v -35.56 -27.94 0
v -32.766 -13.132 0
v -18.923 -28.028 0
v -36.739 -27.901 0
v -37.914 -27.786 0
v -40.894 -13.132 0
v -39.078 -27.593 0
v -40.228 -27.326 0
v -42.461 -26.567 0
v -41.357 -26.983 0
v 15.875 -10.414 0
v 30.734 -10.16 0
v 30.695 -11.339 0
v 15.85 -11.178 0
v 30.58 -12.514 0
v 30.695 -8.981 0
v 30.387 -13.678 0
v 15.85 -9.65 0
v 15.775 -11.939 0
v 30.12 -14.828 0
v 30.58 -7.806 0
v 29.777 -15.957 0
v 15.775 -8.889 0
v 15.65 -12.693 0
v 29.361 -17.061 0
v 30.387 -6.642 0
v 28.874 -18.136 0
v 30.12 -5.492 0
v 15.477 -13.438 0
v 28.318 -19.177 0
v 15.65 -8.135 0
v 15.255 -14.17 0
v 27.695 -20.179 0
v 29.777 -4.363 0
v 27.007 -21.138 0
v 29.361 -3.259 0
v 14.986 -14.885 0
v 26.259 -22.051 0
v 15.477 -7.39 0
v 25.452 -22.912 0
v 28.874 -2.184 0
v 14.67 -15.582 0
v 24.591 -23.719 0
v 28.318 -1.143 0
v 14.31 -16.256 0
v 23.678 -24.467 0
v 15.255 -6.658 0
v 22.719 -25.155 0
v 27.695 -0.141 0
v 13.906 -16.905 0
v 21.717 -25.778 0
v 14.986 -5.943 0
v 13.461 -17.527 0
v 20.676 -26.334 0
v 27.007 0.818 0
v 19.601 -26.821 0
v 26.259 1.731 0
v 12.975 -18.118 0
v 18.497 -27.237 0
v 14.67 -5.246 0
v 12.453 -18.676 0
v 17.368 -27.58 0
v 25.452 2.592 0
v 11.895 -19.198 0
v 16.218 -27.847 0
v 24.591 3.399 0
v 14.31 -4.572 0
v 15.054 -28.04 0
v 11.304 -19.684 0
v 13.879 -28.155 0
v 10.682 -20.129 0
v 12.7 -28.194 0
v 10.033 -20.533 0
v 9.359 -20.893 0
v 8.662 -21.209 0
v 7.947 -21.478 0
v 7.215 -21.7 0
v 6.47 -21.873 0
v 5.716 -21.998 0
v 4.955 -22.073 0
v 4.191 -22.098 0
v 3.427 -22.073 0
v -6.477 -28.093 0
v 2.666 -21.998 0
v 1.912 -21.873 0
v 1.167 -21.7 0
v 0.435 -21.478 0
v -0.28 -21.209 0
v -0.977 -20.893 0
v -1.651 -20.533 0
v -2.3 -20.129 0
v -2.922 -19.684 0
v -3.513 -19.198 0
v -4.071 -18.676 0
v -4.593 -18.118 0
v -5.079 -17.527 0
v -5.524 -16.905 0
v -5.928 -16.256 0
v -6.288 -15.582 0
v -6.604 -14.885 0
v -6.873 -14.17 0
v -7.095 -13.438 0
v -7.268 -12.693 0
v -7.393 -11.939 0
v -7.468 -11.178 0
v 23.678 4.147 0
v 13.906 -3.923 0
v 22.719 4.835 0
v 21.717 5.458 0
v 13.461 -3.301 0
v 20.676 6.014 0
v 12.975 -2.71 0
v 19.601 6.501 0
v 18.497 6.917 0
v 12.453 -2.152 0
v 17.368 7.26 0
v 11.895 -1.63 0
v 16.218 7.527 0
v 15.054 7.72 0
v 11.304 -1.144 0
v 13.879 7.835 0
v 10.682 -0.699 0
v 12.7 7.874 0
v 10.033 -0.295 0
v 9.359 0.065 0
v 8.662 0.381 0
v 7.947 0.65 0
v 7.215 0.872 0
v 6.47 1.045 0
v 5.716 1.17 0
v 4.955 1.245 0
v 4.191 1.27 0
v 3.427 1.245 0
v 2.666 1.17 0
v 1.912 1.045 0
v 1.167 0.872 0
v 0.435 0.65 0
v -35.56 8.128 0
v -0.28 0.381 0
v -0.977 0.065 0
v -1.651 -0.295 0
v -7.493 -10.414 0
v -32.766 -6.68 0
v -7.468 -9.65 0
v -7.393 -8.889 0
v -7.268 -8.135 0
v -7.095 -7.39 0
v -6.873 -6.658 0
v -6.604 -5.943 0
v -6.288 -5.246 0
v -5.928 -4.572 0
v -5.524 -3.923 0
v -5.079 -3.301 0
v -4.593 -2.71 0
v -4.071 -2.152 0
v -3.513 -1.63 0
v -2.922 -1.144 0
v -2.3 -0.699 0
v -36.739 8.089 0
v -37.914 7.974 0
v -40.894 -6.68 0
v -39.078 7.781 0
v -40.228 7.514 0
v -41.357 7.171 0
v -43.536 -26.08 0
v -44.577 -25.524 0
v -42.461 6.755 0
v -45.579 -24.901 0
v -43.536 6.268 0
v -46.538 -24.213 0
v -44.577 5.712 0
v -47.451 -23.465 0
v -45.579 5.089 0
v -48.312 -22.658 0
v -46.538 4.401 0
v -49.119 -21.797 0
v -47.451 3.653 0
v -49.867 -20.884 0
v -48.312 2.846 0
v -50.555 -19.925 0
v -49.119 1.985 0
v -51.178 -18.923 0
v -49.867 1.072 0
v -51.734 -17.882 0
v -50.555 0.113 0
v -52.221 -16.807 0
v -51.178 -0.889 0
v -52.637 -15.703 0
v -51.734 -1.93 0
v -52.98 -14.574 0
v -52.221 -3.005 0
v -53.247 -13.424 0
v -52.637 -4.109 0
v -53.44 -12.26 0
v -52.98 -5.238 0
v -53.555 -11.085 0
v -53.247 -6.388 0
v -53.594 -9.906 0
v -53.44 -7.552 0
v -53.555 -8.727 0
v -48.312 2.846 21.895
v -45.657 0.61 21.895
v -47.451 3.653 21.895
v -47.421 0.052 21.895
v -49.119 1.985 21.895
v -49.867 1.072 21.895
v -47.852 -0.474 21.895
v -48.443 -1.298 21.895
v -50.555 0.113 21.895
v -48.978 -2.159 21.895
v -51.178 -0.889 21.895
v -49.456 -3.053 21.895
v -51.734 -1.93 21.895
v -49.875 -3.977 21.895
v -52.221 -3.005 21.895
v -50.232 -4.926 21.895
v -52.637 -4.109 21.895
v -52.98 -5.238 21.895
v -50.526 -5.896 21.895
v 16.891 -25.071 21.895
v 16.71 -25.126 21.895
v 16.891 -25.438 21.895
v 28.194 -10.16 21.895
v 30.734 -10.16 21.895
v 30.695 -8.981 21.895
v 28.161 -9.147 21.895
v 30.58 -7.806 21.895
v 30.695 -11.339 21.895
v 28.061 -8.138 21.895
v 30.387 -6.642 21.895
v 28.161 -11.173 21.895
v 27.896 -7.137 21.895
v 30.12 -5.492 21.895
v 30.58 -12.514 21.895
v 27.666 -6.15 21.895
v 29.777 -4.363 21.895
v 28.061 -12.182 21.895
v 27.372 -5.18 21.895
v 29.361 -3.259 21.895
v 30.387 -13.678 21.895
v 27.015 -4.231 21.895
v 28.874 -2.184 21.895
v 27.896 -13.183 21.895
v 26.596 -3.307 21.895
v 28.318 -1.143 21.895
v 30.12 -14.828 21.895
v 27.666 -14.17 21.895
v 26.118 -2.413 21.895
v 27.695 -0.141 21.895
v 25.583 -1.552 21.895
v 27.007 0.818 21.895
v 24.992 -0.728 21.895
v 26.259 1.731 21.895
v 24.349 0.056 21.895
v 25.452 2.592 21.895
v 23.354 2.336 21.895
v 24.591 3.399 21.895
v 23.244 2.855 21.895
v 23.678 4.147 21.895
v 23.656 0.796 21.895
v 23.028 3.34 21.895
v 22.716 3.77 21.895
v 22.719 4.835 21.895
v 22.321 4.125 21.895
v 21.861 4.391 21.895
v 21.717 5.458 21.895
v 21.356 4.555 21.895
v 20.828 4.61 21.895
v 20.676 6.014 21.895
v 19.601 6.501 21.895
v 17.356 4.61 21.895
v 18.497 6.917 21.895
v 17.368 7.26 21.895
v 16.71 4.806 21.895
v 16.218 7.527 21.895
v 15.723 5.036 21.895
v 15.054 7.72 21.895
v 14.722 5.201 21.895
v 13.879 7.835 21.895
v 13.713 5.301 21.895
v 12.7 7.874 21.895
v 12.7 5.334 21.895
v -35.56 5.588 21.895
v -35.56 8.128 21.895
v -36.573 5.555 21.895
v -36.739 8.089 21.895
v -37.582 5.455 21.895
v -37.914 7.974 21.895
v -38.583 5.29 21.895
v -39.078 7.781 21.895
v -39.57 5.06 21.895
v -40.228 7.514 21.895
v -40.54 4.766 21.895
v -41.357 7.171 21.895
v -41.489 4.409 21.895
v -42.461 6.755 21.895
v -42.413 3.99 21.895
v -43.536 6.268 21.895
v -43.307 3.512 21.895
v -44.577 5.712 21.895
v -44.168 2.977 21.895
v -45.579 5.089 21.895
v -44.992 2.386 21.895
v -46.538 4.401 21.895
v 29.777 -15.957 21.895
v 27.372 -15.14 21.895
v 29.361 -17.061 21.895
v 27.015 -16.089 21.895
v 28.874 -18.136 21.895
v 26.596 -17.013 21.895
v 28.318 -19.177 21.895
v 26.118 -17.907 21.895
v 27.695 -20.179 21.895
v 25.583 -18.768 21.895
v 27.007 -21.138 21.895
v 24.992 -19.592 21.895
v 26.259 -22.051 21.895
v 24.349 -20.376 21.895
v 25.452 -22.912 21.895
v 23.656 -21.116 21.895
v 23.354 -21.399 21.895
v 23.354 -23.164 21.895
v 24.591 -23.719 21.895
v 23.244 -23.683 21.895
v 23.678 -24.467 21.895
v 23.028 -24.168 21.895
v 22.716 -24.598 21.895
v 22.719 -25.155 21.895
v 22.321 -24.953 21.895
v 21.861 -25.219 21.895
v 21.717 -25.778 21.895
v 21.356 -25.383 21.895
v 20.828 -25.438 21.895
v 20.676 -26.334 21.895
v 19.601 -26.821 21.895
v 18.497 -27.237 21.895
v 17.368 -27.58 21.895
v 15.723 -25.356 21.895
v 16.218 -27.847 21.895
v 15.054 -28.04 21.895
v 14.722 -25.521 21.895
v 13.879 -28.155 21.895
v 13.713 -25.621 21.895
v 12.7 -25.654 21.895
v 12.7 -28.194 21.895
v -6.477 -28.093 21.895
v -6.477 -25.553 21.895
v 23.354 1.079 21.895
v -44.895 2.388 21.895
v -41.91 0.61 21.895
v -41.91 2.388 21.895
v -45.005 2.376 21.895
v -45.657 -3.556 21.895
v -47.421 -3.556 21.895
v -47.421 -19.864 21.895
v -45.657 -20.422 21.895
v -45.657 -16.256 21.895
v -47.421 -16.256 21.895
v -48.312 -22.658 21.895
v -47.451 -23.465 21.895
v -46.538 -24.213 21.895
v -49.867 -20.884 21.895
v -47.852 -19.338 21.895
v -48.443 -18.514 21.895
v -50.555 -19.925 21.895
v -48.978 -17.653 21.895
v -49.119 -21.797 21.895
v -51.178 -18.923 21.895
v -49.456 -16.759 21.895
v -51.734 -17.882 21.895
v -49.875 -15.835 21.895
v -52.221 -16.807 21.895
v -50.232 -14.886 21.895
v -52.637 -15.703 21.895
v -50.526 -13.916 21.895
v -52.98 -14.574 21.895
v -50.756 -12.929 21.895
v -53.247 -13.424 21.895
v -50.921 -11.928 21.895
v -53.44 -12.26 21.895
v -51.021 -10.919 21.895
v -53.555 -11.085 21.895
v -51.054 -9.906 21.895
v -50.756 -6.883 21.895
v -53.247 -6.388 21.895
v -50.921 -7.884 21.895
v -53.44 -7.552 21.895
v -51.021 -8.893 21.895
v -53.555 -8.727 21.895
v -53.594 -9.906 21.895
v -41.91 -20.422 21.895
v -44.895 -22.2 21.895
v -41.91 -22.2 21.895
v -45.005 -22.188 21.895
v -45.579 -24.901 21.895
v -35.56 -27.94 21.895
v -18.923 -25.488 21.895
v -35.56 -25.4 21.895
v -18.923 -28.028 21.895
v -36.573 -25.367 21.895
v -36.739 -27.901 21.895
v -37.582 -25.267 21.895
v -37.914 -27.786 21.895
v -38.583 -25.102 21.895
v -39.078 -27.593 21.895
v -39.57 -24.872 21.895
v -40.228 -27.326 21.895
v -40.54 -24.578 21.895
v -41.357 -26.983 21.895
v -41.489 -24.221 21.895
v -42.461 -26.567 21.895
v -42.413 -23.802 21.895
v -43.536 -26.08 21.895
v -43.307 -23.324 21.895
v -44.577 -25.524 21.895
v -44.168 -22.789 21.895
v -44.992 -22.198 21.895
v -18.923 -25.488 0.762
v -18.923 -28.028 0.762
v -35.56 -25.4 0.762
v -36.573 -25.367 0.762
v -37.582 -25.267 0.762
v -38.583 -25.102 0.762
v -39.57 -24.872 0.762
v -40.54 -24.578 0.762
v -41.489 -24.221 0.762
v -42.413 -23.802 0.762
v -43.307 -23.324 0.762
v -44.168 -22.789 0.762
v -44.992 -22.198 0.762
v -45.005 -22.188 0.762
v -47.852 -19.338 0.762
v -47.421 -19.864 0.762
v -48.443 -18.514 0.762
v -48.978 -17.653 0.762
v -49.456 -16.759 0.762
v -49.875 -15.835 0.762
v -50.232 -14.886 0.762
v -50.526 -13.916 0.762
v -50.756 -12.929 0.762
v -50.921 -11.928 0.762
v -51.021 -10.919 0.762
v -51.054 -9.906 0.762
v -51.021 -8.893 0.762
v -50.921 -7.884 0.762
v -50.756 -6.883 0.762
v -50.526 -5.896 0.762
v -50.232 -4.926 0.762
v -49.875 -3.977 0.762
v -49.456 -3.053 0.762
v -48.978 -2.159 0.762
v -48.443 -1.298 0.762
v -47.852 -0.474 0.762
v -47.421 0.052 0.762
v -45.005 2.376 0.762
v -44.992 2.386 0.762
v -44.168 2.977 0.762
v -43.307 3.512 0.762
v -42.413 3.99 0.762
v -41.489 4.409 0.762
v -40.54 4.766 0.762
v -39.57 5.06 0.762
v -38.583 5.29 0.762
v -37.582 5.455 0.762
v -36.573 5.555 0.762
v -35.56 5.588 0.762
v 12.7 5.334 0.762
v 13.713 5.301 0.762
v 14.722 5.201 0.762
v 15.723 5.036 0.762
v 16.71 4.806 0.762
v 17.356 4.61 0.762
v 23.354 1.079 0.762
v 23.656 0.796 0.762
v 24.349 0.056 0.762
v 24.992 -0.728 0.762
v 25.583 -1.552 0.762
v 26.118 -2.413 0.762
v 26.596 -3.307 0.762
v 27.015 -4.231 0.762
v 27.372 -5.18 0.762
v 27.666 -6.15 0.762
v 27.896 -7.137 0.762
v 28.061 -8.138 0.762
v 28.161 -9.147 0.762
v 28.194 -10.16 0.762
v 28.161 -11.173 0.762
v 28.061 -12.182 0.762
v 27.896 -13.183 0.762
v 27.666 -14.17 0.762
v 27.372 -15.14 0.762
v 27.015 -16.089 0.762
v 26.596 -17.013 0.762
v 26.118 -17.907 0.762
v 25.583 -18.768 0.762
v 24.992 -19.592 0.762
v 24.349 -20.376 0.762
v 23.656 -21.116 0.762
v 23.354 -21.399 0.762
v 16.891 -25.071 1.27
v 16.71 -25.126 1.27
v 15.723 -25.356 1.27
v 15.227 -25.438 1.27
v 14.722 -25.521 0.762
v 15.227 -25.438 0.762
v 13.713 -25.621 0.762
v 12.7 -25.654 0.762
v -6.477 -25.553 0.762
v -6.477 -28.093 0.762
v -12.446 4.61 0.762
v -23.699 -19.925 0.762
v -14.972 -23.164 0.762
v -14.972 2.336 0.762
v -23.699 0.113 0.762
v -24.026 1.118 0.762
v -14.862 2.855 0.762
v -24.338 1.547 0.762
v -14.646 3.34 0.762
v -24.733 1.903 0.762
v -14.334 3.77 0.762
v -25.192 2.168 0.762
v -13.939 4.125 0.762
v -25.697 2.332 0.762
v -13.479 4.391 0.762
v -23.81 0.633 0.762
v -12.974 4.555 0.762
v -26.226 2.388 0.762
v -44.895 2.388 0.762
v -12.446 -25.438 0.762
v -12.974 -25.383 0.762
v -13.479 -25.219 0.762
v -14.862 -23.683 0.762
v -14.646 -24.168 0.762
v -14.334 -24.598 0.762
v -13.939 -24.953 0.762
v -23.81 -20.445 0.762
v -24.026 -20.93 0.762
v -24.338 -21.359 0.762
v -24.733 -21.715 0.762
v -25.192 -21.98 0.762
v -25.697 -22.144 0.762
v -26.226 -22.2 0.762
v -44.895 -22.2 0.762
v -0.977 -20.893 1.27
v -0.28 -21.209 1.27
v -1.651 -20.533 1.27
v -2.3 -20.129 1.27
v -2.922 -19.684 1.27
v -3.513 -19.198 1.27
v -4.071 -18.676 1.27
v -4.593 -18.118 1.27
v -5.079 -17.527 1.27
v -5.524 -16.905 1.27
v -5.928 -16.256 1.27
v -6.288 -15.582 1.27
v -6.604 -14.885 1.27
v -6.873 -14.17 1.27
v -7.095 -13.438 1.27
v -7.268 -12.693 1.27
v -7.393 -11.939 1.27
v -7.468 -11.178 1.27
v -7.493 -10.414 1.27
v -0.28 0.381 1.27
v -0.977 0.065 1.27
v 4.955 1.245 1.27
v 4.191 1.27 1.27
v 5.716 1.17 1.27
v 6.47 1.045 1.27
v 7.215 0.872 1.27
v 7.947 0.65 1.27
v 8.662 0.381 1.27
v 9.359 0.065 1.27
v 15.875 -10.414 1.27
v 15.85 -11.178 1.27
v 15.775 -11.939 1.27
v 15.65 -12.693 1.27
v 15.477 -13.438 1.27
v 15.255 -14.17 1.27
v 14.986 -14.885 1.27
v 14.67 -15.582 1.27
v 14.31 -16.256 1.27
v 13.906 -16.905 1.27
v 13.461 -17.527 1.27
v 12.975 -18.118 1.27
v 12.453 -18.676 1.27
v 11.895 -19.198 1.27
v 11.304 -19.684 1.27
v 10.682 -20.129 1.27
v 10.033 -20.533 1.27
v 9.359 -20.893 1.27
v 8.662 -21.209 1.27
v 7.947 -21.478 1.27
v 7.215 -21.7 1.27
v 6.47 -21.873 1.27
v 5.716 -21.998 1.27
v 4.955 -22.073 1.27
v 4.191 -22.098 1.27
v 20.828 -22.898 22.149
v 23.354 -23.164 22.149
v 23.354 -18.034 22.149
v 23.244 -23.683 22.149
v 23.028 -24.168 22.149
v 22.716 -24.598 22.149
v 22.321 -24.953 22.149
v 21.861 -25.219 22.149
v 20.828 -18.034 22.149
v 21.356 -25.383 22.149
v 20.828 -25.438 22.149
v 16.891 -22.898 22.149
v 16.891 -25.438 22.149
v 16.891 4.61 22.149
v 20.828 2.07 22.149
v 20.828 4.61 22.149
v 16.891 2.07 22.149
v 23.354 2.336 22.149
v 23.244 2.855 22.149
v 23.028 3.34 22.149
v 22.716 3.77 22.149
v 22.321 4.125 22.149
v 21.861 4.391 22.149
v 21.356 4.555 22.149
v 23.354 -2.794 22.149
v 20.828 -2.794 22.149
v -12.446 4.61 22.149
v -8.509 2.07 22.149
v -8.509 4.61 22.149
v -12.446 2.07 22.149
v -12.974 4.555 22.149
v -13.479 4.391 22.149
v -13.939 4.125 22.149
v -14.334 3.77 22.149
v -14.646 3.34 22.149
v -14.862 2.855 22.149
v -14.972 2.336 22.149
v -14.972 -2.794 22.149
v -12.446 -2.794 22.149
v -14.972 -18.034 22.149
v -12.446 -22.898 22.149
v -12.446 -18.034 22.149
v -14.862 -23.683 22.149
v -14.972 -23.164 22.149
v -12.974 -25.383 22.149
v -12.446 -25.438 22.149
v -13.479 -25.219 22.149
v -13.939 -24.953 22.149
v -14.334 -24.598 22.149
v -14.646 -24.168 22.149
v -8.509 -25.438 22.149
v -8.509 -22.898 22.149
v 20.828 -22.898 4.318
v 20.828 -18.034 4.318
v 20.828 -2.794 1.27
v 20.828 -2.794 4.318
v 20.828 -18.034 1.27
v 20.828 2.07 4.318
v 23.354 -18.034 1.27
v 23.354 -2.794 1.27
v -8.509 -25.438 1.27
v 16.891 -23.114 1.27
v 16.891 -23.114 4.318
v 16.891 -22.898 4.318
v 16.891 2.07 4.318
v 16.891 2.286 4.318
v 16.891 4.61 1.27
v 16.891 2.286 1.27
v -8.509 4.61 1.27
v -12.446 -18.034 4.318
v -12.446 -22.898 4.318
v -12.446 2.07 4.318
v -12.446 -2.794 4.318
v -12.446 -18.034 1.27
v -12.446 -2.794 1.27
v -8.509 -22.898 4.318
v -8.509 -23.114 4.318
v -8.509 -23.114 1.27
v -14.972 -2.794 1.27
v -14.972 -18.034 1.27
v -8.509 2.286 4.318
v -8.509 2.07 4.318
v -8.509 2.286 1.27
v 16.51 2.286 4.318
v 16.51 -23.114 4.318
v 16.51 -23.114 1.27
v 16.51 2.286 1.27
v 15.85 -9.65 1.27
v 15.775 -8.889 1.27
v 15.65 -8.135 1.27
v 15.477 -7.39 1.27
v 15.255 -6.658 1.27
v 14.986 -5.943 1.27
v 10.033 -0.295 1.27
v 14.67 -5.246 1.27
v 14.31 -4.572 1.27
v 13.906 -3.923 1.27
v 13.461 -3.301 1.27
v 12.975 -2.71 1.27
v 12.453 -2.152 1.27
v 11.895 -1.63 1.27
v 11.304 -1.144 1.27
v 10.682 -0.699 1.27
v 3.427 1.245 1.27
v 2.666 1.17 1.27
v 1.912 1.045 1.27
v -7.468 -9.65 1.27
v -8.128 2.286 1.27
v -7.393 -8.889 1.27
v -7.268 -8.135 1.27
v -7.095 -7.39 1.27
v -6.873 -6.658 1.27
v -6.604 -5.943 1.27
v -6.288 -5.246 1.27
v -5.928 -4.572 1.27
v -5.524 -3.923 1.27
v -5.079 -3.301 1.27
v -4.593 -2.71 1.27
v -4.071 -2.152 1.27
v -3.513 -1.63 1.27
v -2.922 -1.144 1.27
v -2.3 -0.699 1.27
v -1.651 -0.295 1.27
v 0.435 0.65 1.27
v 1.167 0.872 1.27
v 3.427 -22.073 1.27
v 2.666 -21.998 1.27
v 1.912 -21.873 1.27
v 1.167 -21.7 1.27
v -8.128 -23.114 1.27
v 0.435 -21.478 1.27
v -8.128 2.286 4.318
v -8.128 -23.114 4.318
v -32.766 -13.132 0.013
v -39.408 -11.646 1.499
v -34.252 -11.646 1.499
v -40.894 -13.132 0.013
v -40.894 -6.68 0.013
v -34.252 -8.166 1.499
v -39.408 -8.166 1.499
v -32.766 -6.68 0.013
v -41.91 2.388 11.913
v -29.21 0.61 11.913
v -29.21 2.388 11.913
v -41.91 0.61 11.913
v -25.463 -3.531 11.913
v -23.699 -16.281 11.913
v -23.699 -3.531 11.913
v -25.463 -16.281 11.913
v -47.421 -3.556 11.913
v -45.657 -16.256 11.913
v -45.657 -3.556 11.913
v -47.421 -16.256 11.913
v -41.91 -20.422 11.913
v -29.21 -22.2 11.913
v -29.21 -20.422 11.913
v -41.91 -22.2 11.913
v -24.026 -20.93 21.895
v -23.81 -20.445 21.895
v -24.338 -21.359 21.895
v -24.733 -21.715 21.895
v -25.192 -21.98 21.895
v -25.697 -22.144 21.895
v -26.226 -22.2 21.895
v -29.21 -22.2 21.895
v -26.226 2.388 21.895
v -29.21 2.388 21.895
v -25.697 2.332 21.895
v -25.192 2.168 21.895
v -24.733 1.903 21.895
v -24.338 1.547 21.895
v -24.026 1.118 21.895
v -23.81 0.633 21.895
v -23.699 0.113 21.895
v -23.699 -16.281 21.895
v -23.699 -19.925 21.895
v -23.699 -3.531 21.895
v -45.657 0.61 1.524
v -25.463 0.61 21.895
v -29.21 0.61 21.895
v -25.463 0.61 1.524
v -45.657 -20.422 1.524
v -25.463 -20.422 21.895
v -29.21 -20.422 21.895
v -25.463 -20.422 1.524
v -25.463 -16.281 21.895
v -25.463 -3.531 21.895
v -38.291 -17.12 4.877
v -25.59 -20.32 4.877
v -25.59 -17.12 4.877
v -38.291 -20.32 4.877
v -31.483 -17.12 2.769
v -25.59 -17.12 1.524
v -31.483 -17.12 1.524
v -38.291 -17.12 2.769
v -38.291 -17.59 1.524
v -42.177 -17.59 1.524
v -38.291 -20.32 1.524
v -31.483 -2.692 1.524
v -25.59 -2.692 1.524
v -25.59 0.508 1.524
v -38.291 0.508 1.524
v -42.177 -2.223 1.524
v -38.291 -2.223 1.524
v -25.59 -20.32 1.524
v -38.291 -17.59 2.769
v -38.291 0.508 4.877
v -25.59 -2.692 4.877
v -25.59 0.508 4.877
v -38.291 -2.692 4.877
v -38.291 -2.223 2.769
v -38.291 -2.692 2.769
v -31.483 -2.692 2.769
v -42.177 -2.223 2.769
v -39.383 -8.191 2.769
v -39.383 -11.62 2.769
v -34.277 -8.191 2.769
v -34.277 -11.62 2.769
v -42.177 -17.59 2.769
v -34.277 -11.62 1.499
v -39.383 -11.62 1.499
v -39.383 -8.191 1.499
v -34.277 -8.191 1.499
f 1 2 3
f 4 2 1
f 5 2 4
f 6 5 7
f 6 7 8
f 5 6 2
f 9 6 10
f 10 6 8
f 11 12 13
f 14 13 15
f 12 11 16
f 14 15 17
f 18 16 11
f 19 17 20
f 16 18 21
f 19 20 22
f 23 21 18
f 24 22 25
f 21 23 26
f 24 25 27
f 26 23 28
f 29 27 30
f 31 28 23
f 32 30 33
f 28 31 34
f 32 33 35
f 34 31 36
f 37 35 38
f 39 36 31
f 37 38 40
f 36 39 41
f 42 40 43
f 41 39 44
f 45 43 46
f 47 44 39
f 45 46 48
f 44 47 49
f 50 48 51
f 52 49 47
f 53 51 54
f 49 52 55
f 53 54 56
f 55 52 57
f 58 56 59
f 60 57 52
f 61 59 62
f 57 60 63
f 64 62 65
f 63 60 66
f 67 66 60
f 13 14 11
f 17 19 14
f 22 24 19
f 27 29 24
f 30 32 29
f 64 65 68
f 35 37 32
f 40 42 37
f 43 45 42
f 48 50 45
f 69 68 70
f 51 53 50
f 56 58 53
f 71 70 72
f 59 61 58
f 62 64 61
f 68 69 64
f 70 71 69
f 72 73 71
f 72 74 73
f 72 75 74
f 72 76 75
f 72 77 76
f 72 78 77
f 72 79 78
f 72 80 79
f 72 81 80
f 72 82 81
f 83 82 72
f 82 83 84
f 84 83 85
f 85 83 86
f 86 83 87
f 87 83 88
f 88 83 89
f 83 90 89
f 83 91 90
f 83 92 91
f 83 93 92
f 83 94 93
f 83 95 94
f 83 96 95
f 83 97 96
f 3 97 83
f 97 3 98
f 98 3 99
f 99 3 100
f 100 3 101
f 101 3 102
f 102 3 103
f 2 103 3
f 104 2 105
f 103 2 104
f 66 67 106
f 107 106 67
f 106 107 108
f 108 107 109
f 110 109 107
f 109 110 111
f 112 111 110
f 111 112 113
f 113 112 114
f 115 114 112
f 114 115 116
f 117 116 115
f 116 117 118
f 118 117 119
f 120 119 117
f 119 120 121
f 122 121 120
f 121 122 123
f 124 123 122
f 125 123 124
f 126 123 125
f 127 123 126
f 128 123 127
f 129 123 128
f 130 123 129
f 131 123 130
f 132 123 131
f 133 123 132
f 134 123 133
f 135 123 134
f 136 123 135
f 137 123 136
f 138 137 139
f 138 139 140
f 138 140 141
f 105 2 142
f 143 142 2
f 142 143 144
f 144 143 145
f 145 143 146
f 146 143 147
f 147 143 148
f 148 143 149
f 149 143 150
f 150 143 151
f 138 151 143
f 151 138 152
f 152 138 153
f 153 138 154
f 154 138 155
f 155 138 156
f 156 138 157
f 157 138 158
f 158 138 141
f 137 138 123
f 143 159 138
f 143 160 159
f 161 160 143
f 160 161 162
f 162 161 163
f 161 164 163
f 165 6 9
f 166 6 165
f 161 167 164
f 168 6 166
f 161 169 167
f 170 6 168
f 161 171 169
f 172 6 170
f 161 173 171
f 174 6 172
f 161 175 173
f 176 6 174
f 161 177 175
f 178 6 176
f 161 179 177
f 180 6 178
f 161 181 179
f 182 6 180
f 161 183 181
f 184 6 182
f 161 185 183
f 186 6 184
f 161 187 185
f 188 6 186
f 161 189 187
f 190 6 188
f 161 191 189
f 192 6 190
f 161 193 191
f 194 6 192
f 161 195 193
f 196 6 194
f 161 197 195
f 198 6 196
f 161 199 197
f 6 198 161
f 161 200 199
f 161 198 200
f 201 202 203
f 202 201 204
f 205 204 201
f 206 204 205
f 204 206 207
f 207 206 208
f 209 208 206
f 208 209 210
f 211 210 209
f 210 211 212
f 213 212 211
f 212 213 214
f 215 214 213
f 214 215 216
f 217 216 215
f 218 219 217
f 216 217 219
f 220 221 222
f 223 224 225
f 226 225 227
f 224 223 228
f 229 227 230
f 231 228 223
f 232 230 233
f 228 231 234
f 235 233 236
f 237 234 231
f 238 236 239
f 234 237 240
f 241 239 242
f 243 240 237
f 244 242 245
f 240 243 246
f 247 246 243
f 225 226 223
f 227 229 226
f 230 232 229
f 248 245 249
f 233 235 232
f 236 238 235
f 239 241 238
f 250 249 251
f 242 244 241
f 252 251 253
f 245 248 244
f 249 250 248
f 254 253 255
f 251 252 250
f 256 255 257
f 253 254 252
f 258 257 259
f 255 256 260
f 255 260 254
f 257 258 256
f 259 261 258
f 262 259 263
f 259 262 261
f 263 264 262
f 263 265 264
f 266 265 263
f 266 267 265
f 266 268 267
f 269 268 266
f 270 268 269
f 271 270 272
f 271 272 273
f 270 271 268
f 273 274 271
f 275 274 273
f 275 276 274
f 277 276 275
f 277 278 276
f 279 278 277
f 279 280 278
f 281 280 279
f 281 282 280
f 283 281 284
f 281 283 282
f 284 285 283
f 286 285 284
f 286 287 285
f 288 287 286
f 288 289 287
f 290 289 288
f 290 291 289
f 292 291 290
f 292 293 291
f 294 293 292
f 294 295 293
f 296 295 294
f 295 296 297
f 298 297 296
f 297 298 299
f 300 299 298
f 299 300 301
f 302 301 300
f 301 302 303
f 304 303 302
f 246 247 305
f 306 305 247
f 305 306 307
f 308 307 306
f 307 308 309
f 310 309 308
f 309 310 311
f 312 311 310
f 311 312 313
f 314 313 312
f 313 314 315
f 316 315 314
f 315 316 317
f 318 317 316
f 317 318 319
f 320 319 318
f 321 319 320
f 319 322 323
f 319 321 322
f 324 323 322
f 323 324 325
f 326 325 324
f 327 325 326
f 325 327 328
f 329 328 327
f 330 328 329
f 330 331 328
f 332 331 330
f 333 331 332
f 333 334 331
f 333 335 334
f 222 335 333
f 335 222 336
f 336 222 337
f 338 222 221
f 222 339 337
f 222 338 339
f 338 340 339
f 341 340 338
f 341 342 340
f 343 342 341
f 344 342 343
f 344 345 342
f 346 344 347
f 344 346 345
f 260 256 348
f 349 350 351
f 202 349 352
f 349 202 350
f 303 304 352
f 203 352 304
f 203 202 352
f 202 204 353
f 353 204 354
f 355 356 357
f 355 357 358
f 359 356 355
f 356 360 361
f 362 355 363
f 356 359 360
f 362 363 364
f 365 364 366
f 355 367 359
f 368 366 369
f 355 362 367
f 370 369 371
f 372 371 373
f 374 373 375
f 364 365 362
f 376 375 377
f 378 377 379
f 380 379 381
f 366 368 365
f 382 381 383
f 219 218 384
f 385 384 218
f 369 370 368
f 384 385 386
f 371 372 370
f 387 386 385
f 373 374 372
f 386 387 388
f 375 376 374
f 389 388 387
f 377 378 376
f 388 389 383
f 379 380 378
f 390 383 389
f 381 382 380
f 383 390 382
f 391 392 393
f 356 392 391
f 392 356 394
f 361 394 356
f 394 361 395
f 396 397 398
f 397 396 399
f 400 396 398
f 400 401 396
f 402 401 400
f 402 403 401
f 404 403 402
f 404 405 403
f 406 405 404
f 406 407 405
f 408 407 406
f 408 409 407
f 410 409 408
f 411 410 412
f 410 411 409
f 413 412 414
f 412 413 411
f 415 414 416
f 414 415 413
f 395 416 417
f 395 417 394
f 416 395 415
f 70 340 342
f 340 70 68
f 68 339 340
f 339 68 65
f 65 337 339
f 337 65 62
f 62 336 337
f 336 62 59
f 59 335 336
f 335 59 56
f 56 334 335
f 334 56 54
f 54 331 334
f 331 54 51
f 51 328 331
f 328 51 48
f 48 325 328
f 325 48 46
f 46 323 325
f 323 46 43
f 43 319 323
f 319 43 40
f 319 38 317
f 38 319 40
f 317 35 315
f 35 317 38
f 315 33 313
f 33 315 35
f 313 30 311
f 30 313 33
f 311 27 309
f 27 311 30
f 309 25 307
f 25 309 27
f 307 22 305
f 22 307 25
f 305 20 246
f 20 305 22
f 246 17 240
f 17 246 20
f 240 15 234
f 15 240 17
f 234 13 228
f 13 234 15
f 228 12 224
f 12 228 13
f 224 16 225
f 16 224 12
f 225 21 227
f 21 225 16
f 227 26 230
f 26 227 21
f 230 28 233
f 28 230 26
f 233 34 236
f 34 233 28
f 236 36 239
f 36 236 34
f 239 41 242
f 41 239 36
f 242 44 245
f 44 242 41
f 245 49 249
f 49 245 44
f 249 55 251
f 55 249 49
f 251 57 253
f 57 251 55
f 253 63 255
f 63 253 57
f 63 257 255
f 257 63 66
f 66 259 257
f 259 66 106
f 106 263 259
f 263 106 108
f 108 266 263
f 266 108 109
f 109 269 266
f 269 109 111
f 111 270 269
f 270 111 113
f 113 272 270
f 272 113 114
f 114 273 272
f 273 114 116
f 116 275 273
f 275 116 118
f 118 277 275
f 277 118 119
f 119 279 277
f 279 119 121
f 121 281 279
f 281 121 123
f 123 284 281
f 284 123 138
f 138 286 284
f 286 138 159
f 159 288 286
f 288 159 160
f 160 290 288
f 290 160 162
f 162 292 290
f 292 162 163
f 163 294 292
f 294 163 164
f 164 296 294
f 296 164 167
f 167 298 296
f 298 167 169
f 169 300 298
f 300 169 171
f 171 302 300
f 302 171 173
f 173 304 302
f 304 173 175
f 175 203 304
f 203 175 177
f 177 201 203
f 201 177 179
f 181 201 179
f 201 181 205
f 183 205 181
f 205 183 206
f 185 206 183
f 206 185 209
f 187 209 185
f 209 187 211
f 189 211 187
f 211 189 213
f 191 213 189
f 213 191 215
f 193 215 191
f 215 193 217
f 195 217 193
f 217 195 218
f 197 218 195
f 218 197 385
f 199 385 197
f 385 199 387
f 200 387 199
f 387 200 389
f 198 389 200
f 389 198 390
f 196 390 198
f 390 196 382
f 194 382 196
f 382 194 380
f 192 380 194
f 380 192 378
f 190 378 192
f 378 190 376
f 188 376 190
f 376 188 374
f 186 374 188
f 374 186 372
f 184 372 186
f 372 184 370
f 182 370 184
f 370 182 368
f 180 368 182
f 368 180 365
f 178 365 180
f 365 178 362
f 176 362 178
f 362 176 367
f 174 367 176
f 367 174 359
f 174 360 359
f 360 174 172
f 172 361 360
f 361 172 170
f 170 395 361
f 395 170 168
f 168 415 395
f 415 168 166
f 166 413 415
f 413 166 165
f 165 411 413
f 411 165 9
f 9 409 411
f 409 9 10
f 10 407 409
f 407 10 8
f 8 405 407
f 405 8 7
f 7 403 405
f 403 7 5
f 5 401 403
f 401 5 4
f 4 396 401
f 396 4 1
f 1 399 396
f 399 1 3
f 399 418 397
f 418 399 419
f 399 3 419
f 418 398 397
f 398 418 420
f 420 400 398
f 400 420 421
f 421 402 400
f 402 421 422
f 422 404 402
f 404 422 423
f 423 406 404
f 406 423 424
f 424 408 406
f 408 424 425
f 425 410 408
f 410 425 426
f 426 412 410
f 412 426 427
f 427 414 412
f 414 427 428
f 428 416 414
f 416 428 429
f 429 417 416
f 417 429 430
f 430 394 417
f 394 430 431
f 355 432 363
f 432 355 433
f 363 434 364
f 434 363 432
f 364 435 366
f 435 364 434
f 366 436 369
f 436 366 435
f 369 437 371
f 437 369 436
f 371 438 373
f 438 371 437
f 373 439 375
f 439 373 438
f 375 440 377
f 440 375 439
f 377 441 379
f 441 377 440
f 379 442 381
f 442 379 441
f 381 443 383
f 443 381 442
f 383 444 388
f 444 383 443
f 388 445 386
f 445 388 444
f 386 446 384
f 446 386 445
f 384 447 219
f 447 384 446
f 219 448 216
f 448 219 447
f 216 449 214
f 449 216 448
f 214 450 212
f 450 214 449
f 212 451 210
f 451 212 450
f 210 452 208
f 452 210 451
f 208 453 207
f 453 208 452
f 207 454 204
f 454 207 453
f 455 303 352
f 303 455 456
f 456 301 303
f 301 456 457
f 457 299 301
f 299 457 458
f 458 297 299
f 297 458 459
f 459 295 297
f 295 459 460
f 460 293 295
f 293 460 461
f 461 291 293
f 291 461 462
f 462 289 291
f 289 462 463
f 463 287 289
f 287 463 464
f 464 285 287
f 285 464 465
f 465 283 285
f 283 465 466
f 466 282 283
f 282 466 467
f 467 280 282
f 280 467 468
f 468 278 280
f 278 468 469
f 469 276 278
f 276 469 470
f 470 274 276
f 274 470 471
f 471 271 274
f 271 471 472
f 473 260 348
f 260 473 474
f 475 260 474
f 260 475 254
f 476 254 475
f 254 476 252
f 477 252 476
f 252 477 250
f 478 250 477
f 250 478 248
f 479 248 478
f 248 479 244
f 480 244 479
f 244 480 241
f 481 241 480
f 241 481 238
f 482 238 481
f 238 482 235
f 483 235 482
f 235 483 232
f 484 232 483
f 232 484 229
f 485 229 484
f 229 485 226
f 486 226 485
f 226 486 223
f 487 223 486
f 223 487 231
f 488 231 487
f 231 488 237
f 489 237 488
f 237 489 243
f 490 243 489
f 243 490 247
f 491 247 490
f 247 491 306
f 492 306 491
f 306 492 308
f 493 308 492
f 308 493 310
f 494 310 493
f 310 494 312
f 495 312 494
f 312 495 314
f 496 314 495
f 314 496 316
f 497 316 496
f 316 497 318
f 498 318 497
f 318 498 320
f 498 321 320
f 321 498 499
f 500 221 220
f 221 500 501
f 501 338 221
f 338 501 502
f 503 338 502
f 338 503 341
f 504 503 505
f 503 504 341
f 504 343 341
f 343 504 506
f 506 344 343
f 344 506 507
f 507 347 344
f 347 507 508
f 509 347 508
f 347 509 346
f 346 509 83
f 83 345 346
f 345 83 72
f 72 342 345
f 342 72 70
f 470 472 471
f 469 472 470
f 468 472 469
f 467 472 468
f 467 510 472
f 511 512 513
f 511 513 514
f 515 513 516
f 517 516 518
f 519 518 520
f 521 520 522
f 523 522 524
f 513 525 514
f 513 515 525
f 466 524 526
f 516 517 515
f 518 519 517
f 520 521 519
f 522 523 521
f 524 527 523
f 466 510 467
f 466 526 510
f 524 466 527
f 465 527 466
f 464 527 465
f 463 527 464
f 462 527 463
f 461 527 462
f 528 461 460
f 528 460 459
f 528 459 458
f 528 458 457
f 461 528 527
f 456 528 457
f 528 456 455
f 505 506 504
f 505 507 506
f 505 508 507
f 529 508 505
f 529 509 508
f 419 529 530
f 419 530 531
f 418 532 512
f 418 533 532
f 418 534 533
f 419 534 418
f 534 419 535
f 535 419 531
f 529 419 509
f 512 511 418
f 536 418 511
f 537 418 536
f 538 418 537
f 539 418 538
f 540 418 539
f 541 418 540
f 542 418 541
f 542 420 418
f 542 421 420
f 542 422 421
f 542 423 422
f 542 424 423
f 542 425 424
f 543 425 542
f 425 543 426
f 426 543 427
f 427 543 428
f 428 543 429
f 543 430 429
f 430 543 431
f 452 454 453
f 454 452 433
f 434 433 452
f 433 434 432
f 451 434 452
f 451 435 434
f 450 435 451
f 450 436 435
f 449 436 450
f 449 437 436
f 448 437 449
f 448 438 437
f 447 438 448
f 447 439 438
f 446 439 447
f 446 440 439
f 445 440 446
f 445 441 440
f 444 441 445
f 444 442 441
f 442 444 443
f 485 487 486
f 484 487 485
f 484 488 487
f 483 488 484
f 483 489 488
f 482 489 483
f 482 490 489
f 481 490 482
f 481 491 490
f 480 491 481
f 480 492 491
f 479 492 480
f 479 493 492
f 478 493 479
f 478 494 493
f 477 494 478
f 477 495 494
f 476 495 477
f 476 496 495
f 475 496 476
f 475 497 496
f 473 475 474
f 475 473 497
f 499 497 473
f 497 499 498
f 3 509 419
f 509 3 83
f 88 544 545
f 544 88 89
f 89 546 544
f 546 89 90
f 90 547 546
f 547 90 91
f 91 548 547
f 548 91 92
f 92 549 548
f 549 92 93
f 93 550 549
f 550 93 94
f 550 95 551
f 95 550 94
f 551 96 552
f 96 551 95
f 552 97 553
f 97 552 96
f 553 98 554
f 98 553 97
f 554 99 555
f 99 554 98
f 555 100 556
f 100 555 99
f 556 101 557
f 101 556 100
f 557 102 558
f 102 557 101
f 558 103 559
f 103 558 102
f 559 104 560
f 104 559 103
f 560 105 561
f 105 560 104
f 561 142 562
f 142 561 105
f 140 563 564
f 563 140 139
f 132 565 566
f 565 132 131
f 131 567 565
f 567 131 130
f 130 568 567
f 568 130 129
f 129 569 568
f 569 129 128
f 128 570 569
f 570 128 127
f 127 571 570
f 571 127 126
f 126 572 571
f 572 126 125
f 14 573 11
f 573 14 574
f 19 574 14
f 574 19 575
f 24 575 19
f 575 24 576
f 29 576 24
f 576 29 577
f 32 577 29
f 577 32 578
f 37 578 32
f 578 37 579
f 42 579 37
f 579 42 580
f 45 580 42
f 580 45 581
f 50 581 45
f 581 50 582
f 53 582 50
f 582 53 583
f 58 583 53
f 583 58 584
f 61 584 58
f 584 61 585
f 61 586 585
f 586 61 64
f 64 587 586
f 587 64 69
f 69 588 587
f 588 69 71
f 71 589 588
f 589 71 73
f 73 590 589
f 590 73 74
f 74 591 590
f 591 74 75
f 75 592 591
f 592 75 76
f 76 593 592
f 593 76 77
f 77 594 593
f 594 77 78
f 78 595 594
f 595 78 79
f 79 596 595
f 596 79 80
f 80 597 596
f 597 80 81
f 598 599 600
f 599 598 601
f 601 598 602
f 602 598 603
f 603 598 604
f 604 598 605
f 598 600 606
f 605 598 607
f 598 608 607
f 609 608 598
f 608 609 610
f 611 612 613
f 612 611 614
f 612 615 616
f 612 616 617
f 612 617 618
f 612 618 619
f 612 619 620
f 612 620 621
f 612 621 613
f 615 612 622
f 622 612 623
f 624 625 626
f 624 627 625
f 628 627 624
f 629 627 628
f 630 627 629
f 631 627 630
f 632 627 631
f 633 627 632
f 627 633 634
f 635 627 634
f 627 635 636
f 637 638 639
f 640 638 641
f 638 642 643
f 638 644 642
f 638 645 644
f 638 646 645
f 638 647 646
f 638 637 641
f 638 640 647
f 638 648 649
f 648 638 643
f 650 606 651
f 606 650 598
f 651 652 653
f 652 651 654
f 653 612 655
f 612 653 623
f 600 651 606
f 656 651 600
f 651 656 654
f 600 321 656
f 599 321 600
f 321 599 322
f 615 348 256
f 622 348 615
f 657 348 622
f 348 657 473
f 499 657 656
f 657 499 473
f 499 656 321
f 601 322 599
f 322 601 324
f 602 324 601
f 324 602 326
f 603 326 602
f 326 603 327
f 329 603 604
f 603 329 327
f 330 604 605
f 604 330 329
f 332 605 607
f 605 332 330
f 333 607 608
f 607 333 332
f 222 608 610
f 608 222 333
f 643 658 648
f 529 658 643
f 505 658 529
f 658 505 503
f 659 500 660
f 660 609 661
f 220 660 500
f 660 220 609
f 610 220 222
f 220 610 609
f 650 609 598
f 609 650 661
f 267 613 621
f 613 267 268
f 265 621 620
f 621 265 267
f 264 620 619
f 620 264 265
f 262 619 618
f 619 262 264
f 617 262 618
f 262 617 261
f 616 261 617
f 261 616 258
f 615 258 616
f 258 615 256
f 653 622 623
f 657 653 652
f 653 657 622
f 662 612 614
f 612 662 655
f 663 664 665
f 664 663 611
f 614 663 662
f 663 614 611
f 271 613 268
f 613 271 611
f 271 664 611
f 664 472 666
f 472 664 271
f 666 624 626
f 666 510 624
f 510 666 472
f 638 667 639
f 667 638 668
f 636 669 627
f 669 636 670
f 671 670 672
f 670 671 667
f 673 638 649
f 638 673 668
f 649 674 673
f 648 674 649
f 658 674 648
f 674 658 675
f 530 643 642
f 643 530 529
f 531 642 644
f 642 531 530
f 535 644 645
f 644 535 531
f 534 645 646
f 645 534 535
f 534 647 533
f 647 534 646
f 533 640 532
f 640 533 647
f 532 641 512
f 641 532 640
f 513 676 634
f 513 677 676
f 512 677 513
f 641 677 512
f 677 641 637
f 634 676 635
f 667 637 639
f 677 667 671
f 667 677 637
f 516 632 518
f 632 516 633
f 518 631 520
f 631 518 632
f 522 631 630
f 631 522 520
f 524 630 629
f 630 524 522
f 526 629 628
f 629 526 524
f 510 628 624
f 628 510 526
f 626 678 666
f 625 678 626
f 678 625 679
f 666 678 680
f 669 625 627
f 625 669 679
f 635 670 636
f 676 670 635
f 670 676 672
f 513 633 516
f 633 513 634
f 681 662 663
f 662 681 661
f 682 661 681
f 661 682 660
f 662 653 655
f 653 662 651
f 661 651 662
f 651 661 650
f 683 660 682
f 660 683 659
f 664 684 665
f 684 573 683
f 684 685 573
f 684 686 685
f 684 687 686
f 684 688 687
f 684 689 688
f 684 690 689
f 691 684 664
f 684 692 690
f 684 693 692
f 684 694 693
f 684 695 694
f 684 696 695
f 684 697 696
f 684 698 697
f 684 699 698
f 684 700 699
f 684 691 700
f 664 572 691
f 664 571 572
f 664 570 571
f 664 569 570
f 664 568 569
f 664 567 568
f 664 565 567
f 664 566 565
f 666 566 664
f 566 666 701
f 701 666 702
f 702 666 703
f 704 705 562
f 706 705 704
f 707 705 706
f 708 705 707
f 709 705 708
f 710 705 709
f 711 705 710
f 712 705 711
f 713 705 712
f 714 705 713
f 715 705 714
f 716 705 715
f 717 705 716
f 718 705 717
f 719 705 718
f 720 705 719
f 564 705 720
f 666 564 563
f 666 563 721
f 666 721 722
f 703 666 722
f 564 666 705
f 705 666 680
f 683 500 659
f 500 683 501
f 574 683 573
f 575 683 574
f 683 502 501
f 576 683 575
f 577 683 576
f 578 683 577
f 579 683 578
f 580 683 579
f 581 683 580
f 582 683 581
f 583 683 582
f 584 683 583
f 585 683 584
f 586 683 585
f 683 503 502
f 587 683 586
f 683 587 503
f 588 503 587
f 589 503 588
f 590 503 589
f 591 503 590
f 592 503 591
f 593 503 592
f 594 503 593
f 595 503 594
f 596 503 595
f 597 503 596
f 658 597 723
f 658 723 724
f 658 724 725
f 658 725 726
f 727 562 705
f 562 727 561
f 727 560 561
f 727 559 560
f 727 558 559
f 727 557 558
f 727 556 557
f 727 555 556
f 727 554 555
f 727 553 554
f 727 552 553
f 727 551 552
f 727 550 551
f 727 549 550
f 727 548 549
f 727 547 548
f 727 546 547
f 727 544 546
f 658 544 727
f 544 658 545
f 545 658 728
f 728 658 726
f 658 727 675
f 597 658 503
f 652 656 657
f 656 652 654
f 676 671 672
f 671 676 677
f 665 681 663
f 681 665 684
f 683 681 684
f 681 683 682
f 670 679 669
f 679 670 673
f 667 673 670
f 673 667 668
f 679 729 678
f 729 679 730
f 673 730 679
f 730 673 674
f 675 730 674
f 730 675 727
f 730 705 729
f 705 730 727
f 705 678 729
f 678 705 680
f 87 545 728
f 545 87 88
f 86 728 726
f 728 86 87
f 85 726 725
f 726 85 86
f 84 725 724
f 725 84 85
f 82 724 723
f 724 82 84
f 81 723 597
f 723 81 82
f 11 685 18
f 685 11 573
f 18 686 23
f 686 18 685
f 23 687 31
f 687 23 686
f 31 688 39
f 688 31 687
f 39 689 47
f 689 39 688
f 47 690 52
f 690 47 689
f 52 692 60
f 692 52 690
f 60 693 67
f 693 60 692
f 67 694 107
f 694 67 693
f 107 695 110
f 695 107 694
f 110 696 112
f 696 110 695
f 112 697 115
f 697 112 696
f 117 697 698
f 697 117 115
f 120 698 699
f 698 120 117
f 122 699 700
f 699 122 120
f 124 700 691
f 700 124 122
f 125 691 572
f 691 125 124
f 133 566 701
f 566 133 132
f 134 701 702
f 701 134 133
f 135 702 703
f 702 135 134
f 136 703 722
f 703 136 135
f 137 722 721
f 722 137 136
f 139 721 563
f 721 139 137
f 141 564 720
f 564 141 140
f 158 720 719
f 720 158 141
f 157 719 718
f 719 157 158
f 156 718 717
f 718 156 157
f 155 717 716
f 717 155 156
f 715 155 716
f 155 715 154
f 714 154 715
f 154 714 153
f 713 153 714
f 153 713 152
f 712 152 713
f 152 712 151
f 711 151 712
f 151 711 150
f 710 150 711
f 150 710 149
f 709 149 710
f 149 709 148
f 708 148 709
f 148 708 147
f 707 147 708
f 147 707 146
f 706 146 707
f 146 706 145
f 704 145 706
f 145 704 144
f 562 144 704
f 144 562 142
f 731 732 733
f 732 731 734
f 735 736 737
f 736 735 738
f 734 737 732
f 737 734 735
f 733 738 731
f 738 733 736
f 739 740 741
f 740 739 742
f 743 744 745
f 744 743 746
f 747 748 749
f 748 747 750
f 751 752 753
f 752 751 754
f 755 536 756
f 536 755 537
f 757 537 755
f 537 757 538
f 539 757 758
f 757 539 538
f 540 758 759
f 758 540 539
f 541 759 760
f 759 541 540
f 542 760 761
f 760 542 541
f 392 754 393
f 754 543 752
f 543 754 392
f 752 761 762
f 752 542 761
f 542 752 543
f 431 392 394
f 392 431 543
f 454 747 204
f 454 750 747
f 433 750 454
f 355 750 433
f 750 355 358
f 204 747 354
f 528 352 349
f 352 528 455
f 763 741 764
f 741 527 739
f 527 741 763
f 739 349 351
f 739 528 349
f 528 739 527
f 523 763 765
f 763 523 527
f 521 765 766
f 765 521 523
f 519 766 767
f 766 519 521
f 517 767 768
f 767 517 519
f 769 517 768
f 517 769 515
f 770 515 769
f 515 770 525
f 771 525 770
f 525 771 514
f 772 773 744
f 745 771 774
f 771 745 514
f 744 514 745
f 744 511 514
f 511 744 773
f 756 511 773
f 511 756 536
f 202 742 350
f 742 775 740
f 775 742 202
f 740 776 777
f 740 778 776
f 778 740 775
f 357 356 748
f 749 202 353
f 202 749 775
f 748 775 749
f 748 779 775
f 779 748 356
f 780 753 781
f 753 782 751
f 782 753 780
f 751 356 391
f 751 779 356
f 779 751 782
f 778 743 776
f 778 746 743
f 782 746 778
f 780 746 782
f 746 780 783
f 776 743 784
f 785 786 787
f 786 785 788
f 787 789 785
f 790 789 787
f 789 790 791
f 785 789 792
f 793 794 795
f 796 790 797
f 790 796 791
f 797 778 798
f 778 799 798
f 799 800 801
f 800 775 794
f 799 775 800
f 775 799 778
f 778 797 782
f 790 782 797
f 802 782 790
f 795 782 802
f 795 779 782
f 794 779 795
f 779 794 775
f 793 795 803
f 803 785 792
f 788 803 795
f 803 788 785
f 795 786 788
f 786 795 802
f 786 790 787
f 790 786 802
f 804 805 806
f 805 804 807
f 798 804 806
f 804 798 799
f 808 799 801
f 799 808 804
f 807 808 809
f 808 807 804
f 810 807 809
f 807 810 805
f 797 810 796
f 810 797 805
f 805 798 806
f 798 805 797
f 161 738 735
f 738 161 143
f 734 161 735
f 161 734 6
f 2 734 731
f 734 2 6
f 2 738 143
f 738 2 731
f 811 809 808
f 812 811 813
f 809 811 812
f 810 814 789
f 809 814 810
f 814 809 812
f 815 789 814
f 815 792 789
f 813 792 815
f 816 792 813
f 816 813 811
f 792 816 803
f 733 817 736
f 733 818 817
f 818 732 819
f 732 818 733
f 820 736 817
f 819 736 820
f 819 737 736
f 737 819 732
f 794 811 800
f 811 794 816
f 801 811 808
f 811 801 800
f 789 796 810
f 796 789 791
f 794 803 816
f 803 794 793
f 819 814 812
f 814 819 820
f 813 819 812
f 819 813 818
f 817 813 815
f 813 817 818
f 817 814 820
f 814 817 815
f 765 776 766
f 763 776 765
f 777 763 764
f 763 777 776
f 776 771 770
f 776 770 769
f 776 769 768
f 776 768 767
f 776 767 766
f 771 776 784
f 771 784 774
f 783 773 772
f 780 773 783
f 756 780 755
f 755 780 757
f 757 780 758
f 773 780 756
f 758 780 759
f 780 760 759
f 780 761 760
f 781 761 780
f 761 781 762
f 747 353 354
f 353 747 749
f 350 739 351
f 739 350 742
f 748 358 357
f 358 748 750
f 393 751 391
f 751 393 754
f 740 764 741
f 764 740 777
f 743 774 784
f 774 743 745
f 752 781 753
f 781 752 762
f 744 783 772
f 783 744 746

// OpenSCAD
// file: model_adps9660.scad
module ADPS9660Carrier()
{
    color("CornflowerBlue")
    {
    // pcb + midboard
    linear_extrude(200)
    square([788, 755], center=true);

    // usb 
    translate([0, -755/2-422/2, 0])
    linear_extrude(83)
    square([482, 422], center=true);

    // solder joints on to of midboard
    translate([0, 422-120, 200])
    linear_extrude(75)
    square([606, 120], center=true);

    // solder joints under midboard
    translate([0, 422-120, -75])
    linear_extrude(75)
    square([606, 120], center=true);

    // APDS9660 carrier
    translate([0, -(755-521)/2+35, 200])
    linear_extrude(177)
    square([532, 521], center=true);

    // solder joints on carrier 
    translate([0, -(755-120)/2+35, 377])
    linear_extrude(75)
    square([532, 120], center=true);

    // left lower header base
    translate([-(568+100)/2, -(600-422)/2+20, -100])
    linear_extrude(100)
    square([100, 600], center=true);

    // right lower header base
    translate([(568+100)/2, -(600-422)/2+20, -100])
    linear_extrude(100)
    square([100, 600], center=true);

    // left lower headers
    translate([-(568+100)/2, -(600-422)/2+20, -320])
    linear_extrude(220)
    square([28, 524], center=true);

    // right lower header base
    translate([(568+100)/2, -(600-422)/2+20, -320])
    linear_extrude(220)
    square([28, 524], center=true);
    }

    color("OrangeRed")
    {
    // APDS9660 sensor
    translate([0, 521/2-161, 377])
    linear_extrude(56)
    square([95, 161], center=true);
    }
}
// main file
use <model_adps9660.scad>

ViewScale = [0.0254, 0.0254, 0.0254];

module fpEdge(r1, r2)
{
    hull() {
    // PIR detector
    translate([500, -400, 0])
    circle(r1, $fn=96);
    // Gesture sensor
    //translate([-900-710, -900+710, 0])
    translate([-1400, -900+510, 0])
    circle(r2, $fn=96);
    }
}


module faceplate()
{
    linear_extrude(862)
    translate([0, 0, 30])
    {
        difference(){
            fpEdge(710, 710);
            fpEdge(610, 610); 
            translate([-500, -1050, 0])
            square([490, 120], center=true);
        }
        //difference() {
        //translate([-250, -900, 0])
        //square([590, 200], center=true);
        //translate([-250, -950, 0])
        //square([490, 100], center=true);
        //}
    }
    linear_extrude(30)
    difference() {
    fpEdge(710, 710);
    translate([165, -410, 0])
    circle(460, $fn=96);
    translate([-1450, -390, 0])
    square([321, 255], center=true);
    }

    // clip rails
    //translate([795/2+175-50, 295]) square([100, 100], center=true);
    //translate([795/2+175-50, -295]) square([100, 100], center=true);
}

// ----------------------------------------------------------------
//
// PIR Detector Housing
//
// ----------------------------------------------------------------
module rectHull(r, x, y)
{
    hull()
    {
        translate([(-x/2)+r, (-y/2)+r, 0]) circle(r=r);
        translate([(x/2)-r, (-y/2)+r, 0]) circle(r=r);
        translate([(-x/2)+r, (y/2)-r, 0]) circle(r=r);
        translate([(x/2)-r, (y/2)-r, 0]) circle(r=r);
    }
}

module enclosure_pirDetector()
{
    // outside cover
    linear_extrude(872) 
    difference() {
       rectHull(100, 1183, 1510);
       square([983, 1310], center=true);
       square([600, 1600], center=true);
       square([1400, 1000], center=true);
    }

    // Right support
    translate([0, (1280-140)/2, 350+65+227+60])
    linear_extrude(120)
    square([1000, 170], center=true);

    // Left support
    translate([0, -(1280-140)/2, 350+65+227+60])
    linear_extrude(120)
    square([1000, 170], center=true);

    // Dome base
    translate([0, 0, 762+60])
    linear_extrude(50)
    difference() {
        rectHull(100, 1183, 1510);
        circle(460, $fn=96);
    }
}

// ----------------------------------------------------------------
//
// Gesture Sensor Housing
//
// ----------------------------------------------------------------
module side(l,d)
{
    rotate([90, 0, 0])
    translate([-d, 0, -l/2])
    linear_extrude(l)
    polygon(points=[[0, 0], [d, 0],[d, d]]);
}

module sides(w, h, d)
{
    union() {
   translate([h/2, 0, 0])  rotate([0, 0, 0]) side(w,d);
   translate([-h/2, 0, 0])  rotate([0, 0, 180]) side(w,d);

   translate([0, w/2, 0])  rotate([0, 0, 90]) side(h,d);
   translate([0, -w/2, 0])  rotate([0, 0, -90]) side(h,d);
    }
}

module enclosure_gestureSensor()
{
    // main pcb surround
    translate([0, 0, 93])
    linear_extrude(469)
    {
    difference() {
    translate([0, 0, 0])
    rectHull(100, 968, 935);
    square([828, 795], center=true);
    }
    }

    // right support
    translate([(788-100)/2+3, -(755-500)/2-15, 300+70])
    linear_extrude(132)
    square([126, 500], center=true);

    // left support
    translate([-(788-100)/2-3, -(755-500)/2-15, 300+70])
    linear_extrude(132)
    square([126, 500], center=true);

    // cover
    translate([0, 0, 462+40])
    linear_extrude(60)
    difference() {
    rectHull(100, 968, 935);
    translate([0, 50, 0])
    square([254, 320], center=true);
    }

    // mounting around sensor
    // w,h,d 
    translate([0, 50, 432+70])
    {
        sides(321, 255, 60);
    }

    // mounting support
    translate([0, 50, 383+70])
    linear_extrude(50)
    difference() {
        square([605, 421], center=true);
        square([135, 201], center=true);
    }

    // surround with cutout for usb
    translate([0, 0, -300])
    linear_extrude(403) {
    difference() {
        translate([0, 0, 0])
        rectHull(100, 968, 935);
        square([828, 795], center=true);
        translate([0, -(755)/2, 0])
        square([502, 200], center=true);
        square([1000, 500], center=true);
        translate([0, 400, 0])
        square([500, 200], center=true);
    }
    // clip rails
    //translate([795/2+175-50, 295]) square([100, 100], center=true);
    //translate([795/2+175-50, -295]) square([100, 100], center=true);
    }
}

scale(ViewScale)
{
    //linear_extrude(900)
    faceplate();
    translate([165, -410, 872])
    rotate([180, 0, 90])
    enclosure_pirDetector();

    //translate([-900-710, 0, 562])
    translate([-1400, -390, 562])
    rotate([180, 0, -90])
    enclosure_gestureSensor();
//    translate([0, 0, 453-65])
//    ADPS9660Carrier();
}
